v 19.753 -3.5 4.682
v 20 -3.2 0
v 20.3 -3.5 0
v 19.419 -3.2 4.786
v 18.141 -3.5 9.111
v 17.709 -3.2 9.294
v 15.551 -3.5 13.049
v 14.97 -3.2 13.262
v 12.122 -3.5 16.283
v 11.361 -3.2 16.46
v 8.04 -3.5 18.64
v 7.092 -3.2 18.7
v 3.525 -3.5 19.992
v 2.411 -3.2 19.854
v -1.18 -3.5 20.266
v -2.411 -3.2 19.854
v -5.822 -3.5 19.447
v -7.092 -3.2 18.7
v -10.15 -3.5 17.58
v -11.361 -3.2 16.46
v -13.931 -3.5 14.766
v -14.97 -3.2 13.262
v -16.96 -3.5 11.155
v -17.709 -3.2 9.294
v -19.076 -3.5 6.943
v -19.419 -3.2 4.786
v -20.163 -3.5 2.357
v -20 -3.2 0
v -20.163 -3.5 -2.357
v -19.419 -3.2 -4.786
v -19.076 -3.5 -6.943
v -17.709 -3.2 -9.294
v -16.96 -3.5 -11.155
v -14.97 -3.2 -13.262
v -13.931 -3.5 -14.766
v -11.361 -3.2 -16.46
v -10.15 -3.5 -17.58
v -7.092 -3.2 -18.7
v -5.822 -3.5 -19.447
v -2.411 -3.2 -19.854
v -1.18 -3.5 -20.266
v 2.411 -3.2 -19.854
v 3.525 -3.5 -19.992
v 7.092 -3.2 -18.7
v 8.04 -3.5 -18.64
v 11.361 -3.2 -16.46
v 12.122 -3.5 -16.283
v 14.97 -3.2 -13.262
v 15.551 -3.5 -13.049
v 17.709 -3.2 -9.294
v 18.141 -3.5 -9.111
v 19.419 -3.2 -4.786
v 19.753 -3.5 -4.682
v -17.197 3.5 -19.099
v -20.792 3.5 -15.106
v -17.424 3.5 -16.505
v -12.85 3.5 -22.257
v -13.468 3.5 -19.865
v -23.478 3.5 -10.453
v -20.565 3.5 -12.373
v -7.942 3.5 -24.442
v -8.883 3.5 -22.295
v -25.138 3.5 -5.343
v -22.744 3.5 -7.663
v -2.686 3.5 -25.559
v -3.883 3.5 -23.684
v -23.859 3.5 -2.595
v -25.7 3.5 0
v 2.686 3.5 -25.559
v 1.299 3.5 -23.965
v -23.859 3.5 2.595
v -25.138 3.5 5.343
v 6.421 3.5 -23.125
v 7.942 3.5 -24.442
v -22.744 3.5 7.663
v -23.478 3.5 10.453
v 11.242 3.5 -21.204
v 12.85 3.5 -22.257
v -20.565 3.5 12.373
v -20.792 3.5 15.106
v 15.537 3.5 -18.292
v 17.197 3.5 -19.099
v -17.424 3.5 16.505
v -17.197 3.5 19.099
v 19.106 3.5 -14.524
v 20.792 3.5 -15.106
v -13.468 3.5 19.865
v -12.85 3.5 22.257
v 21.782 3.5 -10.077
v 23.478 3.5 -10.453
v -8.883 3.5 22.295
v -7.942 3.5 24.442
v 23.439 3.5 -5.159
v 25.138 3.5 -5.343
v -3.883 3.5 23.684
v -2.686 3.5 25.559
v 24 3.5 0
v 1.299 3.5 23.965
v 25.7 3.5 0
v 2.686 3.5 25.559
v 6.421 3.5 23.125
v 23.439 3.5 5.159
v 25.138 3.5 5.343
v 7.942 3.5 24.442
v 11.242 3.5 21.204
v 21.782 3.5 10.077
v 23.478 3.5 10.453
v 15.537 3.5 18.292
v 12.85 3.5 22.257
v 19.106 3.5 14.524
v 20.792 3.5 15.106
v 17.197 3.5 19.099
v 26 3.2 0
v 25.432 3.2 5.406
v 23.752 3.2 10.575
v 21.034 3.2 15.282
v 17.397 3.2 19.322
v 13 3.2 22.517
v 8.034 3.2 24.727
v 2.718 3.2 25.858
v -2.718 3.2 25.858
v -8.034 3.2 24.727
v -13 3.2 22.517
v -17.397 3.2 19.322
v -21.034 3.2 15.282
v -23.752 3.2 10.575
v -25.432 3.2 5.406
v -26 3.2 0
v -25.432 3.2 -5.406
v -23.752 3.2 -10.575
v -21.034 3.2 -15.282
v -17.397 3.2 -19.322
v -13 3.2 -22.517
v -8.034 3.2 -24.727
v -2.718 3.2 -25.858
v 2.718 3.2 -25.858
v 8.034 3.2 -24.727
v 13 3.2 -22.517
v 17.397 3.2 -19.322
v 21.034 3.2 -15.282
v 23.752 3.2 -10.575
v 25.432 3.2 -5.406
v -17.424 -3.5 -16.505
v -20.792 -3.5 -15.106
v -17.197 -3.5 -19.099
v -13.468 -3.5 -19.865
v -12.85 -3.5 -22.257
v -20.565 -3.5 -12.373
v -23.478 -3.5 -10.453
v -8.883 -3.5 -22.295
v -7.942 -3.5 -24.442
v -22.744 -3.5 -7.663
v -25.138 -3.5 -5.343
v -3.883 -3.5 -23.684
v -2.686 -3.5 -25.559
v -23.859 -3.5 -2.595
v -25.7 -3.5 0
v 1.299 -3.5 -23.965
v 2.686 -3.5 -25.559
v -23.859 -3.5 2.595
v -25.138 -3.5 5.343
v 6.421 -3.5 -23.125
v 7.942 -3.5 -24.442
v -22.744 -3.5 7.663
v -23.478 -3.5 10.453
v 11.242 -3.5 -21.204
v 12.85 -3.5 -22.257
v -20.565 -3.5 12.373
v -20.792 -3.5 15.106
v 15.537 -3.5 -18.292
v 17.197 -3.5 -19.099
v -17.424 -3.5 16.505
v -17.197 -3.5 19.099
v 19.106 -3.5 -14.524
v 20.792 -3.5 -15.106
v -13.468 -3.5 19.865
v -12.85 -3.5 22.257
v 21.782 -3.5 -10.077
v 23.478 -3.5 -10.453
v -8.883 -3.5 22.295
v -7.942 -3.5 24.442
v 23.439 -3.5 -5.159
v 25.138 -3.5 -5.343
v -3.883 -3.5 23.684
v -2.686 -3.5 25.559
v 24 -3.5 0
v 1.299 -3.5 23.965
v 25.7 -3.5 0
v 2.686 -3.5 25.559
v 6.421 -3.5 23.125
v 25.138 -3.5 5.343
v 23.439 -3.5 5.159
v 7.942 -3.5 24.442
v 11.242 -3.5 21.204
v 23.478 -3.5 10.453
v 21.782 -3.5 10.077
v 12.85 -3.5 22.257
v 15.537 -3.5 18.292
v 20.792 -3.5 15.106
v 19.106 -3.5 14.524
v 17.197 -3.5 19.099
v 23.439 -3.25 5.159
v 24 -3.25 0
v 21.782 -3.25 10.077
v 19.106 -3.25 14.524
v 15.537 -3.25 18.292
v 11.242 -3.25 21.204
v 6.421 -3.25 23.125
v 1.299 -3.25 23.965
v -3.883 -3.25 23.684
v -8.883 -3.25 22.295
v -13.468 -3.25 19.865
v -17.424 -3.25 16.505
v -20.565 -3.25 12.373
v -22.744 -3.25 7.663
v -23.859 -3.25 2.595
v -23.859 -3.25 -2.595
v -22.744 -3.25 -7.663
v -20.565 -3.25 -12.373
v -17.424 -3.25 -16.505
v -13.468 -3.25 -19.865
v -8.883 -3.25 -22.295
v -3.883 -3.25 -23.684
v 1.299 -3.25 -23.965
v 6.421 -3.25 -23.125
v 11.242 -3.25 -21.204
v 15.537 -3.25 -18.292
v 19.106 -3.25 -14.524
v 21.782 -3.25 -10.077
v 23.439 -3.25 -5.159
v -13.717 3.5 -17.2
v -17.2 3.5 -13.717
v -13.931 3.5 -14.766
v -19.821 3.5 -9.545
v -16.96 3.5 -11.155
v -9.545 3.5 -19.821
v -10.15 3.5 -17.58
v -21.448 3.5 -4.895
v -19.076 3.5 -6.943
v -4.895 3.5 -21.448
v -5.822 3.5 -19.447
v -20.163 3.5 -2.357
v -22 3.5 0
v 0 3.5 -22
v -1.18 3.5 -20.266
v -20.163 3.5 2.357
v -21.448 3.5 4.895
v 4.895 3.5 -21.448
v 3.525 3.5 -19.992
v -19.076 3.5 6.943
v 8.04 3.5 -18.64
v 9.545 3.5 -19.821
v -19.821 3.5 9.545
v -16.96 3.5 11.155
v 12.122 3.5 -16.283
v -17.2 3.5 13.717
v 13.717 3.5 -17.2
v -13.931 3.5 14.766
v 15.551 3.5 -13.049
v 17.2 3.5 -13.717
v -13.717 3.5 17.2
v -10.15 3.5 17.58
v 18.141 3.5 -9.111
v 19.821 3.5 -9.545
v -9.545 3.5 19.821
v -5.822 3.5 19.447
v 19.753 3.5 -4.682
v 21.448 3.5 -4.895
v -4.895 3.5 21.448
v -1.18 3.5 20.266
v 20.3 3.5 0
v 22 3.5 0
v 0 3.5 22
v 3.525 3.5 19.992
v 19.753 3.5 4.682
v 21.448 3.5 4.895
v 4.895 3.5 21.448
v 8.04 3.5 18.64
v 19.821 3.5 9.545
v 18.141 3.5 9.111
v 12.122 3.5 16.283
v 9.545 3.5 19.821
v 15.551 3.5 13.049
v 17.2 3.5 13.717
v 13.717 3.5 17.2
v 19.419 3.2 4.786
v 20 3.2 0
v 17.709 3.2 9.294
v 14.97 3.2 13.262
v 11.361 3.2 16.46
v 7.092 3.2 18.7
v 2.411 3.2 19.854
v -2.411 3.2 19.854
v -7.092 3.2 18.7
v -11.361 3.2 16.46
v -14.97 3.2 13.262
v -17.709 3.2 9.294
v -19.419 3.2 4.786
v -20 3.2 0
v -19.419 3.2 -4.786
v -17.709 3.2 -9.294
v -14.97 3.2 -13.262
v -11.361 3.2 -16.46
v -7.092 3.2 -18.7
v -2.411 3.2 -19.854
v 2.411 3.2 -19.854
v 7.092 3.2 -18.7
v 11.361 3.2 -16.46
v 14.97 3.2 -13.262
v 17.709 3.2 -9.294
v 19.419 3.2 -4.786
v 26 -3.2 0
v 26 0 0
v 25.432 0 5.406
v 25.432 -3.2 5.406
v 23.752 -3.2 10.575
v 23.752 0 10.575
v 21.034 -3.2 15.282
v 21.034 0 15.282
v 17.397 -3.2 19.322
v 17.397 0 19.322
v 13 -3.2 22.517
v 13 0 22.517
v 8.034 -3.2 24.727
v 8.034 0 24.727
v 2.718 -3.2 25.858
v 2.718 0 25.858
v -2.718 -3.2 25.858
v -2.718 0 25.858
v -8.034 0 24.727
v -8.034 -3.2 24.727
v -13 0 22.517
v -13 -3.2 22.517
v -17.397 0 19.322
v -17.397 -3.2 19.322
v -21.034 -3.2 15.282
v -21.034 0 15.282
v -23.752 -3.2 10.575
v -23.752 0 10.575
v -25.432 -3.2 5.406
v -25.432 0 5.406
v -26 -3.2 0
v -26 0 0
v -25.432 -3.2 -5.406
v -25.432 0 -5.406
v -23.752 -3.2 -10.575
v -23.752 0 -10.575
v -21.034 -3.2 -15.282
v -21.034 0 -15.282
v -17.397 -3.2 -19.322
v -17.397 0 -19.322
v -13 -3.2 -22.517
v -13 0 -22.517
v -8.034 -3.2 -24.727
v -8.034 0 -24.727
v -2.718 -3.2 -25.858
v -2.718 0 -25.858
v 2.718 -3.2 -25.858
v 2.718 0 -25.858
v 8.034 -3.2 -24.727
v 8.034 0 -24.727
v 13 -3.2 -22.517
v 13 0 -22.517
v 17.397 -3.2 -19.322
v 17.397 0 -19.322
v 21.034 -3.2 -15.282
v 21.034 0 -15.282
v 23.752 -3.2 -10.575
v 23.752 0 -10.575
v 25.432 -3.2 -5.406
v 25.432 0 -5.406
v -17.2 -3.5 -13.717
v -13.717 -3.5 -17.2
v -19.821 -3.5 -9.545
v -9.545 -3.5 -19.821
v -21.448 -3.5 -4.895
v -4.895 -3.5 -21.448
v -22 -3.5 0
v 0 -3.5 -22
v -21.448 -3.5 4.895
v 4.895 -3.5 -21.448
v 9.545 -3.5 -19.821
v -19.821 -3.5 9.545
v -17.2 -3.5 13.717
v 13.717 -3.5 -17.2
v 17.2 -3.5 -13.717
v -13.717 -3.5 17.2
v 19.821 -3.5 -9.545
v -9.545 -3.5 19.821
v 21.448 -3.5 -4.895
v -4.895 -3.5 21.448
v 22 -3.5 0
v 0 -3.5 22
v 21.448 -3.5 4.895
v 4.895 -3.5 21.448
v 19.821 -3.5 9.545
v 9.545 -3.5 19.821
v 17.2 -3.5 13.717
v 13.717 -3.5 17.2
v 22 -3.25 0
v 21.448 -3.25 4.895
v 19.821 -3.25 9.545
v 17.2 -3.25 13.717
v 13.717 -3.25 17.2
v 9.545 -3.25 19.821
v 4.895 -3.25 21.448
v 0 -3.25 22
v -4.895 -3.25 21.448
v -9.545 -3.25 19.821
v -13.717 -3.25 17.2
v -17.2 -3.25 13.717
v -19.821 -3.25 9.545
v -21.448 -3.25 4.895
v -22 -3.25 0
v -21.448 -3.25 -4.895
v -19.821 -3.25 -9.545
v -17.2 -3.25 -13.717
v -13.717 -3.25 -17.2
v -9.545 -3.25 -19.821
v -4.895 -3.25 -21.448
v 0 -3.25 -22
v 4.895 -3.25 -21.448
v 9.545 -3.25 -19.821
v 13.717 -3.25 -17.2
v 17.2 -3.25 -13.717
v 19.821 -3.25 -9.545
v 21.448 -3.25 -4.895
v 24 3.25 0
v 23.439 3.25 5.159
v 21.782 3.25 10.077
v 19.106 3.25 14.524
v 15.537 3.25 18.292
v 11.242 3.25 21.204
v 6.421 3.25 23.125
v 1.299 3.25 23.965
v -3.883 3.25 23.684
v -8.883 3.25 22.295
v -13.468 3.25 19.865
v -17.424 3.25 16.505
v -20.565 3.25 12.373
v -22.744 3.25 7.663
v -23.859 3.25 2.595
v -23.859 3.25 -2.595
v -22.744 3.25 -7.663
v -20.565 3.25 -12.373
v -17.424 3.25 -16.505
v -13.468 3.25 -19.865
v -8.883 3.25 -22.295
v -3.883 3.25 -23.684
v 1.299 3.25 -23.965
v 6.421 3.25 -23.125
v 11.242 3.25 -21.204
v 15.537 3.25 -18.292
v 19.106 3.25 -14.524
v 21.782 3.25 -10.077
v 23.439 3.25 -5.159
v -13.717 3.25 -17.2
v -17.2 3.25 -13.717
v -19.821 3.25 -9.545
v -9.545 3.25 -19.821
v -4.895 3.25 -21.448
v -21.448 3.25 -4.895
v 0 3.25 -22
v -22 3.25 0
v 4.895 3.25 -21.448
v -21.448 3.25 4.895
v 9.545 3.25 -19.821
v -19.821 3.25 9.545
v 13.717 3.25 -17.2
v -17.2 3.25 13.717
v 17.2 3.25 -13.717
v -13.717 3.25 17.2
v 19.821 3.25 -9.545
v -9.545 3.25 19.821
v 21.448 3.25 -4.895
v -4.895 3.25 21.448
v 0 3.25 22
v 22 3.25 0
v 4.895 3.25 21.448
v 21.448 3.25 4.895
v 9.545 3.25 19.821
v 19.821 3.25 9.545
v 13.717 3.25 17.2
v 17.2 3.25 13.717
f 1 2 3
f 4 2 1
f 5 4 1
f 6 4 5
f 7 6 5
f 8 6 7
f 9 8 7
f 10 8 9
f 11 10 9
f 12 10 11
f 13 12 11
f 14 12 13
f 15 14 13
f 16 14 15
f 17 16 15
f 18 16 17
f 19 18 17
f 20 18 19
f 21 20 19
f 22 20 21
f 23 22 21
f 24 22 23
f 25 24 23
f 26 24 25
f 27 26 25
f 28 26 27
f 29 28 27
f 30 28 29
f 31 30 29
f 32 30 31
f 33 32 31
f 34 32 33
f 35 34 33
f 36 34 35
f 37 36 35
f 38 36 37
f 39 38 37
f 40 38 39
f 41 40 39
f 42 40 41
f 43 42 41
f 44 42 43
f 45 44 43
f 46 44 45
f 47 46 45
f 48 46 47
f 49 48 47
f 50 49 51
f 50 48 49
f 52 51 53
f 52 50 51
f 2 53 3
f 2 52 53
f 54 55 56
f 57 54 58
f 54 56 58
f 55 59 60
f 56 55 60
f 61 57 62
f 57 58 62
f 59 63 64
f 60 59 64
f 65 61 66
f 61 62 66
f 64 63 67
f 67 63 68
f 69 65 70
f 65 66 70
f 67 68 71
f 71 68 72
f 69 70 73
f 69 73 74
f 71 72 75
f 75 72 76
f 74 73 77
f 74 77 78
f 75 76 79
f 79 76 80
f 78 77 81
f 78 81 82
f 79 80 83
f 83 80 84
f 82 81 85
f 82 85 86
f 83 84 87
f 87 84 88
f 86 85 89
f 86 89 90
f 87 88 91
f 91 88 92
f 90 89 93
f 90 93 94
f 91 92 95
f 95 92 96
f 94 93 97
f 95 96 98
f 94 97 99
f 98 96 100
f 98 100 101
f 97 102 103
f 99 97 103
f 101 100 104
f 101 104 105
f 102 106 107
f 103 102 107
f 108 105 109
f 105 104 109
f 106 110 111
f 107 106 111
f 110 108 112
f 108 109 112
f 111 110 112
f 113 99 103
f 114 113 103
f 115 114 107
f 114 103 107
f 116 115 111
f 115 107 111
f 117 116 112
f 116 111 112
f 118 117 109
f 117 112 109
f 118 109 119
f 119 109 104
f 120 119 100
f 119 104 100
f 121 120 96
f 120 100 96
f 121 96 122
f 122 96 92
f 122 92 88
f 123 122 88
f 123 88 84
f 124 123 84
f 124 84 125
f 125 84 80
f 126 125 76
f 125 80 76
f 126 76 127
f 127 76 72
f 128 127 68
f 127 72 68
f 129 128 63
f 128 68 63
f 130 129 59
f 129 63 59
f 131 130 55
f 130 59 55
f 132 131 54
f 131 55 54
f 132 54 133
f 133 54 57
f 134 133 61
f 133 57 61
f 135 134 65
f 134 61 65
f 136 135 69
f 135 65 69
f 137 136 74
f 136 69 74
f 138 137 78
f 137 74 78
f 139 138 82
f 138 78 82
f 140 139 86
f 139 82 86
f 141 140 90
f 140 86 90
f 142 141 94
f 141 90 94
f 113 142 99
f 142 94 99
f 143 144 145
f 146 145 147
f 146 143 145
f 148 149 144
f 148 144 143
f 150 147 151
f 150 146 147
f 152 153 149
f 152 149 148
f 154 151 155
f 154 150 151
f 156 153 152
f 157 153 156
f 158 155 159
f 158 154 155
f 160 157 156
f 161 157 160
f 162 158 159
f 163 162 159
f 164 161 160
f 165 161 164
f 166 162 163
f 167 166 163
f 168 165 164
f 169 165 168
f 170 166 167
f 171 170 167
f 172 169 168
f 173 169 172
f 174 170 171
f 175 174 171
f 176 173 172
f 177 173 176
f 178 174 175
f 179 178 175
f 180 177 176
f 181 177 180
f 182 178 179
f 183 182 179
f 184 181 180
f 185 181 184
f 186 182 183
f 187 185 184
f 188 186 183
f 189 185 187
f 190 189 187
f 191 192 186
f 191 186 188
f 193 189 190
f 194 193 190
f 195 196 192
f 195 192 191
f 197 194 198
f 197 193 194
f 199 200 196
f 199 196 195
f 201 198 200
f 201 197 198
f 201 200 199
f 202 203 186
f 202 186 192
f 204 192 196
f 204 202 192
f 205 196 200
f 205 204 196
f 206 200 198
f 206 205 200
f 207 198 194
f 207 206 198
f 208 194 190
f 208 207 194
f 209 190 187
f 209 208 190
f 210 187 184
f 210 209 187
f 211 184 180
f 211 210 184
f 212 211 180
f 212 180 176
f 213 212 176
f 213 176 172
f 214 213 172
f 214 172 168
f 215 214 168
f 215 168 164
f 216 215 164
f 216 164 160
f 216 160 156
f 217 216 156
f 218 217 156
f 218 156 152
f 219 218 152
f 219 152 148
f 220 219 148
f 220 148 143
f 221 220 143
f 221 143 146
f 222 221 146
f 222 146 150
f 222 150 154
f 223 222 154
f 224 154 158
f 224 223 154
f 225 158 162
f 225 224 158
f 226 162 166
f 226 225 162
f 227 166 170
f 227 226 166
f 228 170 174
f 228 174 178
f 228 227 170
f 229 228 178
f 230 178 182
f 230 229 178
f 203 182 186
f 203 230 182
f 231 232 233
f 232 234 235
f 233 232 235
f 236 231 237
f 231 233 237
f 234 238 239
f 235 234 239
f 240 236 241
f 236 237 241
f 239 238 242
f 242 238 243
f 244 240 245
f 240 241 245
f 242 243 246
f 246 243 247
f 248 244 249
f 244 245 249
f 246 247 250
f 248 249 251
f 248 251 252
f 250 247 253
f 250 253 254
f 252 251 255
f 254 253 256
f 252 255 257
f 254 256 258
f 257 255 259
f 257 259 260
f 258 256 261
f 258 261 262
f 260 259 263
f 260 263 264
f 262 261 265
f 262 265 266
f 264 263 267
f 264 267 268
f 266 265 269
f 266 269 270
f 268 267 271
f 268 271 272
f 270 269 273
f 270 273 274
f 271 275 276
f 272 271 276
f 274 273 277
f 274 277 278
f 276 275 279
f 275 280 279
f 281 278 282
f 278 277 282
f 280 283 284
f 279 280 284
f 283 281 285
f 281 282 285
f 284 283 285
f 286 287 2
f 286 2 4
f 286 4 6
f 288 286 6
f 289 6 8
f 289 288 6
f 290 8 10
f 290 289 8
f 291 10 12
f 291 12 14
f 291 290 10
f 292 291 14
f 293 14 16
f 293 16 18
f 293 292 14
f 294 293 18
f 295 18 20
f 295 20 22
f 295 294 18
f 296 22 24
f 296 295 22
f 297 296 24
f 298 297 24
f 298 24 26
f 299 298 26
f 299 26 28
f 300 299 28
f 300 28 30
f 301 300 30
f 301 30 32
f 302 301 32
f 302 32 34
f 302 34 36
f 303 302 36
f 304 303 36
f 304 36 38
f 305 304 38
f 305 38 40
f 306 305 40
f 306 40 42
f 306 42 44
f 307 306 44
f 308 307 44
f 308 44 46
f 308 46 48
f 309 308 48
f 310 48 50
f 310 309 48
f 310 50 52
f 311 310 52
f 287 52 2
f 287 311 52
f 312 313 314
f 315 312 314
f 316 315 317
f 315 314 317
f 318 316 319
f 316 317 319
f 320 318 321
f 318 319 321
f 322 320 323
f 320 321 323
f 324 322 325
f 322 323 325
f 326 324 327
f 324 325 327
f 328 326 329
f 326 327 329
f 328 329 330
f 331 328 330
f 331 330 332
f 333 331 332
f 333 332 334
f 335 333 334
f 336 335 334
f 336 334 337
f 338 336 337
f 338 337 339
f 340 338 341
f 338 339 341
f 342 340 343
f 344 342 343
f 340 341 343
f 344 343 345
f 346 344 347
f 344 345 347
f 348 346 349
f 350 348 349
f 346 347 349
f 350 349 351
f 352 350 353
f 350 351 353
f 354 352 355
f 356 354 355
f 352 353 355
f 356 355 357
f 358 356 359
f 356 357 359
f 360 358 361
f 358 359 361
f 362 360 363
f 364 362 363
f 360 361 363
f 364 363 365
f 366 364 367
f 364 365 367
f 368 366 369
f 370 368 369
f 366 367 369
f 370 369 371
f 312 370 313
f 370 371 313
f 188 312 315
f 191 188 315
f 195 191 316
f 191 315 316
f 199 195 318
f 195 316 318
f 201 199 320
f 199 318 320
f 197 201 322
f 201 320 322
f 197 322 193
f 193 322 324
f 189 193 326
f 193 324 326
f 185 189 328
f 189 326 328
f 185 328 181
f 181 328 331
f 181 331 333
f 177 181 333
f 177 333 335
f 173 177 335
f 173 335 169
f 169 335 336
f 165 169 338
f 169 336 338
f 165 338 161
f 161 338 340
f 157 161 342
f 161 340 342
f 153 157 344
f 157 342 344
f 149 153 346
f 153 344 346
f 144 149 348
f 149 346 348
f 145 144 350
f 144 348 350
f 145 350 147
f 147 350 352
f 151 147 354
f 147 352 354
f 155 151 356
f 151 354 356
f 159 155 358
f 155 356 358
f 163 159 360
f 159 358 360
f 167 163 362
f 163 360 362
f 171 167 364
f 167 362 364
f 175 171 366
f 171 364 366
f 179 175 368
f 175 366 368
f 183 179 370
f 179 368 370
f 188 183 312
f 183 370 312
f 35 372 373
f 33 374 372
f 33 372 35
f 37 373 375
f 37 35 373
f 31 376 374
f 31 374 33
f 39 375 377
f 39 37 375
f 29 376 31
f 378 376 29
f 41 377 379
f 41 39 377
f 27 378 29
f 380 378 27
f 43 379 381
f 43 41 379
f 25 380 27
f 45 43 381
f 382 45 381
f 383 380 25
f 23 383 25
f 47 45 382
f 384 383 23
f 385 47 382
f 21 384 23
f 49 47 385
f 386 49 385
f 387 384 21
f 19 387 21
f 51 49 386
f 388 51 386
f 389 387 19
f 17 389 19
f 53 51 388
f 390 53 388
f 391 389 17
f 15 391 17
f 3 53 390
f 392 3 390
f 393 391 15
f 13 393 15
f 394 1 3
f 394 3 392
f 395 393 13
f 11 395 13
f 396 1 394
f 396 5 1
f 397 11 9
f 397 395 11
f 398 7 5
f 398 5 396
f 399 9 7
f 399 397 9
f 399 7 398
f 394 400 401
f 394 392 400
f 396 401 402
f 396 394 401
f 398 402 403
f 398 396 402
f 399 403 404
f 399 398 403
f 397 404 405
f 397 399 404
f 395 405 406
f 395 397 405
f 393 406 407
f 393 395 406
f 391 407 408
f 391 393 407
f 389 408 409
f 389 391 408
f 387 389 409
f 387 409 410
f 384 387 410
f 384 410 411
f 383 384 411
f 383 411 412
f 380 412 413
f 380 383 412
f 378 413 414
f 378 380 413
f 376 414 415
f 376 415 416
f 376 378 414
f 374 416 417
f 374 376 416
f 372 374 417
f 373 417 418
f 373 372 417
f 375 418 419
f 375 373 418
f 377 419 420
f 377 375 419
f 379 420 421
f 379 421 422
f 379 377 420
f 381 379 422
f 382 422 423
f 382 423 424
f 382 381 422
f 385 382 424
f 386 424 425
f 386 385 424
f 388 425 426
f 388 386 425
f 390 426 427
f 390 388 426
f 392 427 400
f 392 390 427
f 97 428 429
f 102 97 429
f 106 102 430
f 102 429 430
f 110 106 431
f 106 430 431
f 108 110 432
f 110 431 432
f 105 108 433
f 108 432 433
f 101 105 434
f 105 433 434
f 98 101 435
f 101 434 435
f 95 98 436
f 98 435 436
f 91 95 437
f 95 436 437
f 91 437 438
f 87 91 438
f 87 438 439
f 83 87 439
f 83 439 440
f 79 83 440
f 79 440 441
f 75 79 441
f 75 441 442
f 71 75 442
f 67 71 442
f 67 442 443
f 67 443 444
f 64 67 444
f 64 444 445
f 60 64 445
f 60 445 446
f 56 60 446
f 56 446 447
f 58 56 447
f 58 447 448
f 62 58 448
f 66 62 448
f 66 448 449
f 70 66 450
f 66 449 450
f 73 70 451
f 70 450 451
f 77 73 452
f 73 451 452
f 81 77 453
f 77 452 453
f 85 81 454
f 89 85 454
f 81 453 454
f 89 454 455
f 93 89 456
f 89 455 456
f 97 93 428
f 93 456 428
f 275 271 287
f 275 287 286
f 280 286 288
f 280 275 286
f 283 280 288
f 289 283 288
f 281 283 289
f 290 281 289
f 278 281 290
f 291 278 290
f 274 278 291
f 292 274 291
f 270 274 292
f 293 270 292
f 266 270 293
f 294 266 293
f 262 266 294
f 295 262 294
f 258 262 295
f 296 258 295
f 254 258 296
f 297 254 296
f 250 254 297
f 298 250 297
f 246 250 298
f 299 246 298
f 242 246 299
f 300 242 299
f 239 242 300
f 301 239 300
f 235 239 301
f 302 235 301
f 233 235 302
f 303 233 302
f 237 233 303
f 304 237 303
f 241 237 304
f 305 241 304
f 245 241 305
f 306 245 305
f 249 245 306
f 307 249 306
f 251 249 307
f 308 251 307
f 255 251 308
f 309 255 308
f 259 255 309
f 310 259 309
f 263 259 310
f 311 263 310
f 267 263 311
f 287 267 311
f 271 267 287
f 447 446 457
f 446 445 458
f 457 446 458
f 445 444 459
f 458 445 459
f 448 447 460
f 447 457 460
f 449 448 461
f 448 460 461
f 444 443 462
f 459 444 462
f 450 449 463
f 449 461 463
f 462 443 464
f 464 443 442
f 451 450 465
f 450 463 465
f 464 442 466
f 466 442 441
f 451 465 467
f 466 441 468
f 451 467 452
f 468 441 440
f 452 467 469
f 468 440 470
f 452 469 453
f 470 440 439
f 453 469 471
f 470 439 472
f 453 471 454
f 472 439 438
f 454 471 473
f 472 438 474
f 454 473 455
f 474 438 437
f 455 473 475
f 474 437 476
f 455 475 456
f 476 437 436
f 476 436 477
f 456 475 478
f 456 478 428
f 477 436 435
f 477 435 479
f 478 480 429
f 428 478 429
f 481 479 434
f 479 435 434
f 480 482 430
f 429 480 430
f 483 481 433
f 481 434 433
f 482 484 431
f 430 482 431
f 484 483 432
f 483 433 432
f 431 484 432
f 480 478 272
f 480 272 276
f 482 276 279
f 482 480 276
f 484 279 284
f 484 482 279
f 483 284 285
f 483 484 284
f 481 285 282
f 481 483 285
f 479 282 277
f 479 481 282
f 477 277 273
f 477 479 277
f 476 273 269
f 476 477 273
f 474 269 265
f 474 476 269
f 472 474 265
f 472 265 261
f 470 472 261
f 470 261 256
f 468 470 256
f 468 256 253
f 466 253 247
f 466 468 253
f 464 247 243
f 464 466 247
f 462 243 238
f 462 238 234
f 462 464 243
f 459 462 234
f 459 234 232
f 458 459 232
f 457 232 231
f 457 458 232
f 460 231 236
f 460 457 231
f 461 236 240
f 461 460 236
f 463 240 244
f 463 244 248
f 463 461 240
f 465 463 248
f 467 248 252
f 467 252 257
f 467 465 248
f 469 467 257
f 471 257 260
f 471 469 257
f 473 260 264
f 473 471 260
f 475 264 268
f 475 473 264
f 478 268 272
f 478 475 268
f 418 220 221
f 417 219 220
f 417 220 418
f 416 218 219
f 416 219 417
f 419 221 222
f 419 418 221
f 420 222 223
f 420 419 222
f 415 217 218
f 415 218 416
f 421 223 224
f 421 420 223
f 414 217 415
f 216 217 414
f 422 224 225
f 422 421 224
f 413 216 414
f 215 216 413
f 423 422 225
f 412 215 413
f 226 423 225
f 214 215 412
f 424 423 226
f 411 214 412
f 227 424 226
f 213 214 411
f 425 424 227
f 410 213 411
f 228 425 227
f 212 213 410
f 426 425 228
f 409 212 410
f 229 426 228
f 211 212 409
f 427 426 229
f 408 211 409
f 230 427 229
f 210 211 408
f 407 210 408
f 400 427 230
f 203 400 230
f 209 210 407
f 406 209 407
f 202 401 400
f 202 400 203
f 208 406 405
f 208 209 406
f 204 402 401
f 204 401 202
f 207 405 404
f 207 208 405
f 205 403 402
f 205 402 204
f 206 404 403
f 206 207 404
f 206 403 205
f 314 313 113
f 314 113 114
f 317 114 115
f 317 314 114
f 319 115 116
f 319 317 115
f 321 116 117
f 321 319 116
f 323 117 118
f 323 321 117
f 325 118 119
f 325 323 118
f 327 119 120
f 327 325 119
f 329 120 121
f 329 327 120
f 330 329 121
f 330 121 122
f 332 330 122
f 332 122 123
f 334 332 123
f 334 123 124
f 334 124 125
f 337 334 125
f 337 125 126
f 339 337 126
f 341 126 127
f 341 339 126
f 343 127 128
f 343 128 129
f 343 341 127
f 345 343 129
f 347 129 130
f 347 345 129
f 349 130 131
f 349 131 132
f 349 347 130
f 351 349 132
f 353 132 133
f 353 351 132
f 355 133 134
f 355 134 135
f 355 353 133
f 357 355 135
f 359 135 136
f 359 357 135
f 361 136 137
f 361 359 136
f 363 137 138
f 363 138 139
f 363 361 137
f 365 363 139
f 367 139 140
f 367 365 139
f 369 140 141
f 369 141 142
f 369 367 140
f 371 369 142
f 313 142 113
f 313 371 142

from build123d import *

# Parameters (mm, degrees)
F0_R     = 26
F0_R_2   = 24
F0_R_3   = 22
F0_R_4   = 20
F1_DEPTH = 3.5
F2_DEPTH = 3.25
F3_SIZE  = 0.3


with BuildPart() as f1:
    # F0 (on Front) → F1 (new body, symmetric)
    with BuildSketch(Plane.XZ):
        Circle(F0_R)
        Circle(F0_R_2, mode=Mode.SUBTRACT)
        Circle(F0_R_3)
        Circle(F0_R_4, mode=Mode.SUBTRACT)
    extrude(amount=F1_DEPTH, both=True)

    # F0 (on Front) → F2 (join, symmetric)
    with BuildSketch(Plane.XZ):
        Circle(F0_R_2)
        Circle(F0_R_3, mode=Mode.SUBTRACT)
    extrude(amount=F2_DEPTH, both=True)

    # F3
    f3_edges = [f1.edges().sort_by_distance(p)[0] for p in [
        (-26, -3.5, 0),
        (-26, 3.5, 0),
        (-20, -3.5, 0),
        (-20, 3.5, 0),
    ]]
    chamfer(f3_edges, length=F3_SIZE)


solid = f1.part
